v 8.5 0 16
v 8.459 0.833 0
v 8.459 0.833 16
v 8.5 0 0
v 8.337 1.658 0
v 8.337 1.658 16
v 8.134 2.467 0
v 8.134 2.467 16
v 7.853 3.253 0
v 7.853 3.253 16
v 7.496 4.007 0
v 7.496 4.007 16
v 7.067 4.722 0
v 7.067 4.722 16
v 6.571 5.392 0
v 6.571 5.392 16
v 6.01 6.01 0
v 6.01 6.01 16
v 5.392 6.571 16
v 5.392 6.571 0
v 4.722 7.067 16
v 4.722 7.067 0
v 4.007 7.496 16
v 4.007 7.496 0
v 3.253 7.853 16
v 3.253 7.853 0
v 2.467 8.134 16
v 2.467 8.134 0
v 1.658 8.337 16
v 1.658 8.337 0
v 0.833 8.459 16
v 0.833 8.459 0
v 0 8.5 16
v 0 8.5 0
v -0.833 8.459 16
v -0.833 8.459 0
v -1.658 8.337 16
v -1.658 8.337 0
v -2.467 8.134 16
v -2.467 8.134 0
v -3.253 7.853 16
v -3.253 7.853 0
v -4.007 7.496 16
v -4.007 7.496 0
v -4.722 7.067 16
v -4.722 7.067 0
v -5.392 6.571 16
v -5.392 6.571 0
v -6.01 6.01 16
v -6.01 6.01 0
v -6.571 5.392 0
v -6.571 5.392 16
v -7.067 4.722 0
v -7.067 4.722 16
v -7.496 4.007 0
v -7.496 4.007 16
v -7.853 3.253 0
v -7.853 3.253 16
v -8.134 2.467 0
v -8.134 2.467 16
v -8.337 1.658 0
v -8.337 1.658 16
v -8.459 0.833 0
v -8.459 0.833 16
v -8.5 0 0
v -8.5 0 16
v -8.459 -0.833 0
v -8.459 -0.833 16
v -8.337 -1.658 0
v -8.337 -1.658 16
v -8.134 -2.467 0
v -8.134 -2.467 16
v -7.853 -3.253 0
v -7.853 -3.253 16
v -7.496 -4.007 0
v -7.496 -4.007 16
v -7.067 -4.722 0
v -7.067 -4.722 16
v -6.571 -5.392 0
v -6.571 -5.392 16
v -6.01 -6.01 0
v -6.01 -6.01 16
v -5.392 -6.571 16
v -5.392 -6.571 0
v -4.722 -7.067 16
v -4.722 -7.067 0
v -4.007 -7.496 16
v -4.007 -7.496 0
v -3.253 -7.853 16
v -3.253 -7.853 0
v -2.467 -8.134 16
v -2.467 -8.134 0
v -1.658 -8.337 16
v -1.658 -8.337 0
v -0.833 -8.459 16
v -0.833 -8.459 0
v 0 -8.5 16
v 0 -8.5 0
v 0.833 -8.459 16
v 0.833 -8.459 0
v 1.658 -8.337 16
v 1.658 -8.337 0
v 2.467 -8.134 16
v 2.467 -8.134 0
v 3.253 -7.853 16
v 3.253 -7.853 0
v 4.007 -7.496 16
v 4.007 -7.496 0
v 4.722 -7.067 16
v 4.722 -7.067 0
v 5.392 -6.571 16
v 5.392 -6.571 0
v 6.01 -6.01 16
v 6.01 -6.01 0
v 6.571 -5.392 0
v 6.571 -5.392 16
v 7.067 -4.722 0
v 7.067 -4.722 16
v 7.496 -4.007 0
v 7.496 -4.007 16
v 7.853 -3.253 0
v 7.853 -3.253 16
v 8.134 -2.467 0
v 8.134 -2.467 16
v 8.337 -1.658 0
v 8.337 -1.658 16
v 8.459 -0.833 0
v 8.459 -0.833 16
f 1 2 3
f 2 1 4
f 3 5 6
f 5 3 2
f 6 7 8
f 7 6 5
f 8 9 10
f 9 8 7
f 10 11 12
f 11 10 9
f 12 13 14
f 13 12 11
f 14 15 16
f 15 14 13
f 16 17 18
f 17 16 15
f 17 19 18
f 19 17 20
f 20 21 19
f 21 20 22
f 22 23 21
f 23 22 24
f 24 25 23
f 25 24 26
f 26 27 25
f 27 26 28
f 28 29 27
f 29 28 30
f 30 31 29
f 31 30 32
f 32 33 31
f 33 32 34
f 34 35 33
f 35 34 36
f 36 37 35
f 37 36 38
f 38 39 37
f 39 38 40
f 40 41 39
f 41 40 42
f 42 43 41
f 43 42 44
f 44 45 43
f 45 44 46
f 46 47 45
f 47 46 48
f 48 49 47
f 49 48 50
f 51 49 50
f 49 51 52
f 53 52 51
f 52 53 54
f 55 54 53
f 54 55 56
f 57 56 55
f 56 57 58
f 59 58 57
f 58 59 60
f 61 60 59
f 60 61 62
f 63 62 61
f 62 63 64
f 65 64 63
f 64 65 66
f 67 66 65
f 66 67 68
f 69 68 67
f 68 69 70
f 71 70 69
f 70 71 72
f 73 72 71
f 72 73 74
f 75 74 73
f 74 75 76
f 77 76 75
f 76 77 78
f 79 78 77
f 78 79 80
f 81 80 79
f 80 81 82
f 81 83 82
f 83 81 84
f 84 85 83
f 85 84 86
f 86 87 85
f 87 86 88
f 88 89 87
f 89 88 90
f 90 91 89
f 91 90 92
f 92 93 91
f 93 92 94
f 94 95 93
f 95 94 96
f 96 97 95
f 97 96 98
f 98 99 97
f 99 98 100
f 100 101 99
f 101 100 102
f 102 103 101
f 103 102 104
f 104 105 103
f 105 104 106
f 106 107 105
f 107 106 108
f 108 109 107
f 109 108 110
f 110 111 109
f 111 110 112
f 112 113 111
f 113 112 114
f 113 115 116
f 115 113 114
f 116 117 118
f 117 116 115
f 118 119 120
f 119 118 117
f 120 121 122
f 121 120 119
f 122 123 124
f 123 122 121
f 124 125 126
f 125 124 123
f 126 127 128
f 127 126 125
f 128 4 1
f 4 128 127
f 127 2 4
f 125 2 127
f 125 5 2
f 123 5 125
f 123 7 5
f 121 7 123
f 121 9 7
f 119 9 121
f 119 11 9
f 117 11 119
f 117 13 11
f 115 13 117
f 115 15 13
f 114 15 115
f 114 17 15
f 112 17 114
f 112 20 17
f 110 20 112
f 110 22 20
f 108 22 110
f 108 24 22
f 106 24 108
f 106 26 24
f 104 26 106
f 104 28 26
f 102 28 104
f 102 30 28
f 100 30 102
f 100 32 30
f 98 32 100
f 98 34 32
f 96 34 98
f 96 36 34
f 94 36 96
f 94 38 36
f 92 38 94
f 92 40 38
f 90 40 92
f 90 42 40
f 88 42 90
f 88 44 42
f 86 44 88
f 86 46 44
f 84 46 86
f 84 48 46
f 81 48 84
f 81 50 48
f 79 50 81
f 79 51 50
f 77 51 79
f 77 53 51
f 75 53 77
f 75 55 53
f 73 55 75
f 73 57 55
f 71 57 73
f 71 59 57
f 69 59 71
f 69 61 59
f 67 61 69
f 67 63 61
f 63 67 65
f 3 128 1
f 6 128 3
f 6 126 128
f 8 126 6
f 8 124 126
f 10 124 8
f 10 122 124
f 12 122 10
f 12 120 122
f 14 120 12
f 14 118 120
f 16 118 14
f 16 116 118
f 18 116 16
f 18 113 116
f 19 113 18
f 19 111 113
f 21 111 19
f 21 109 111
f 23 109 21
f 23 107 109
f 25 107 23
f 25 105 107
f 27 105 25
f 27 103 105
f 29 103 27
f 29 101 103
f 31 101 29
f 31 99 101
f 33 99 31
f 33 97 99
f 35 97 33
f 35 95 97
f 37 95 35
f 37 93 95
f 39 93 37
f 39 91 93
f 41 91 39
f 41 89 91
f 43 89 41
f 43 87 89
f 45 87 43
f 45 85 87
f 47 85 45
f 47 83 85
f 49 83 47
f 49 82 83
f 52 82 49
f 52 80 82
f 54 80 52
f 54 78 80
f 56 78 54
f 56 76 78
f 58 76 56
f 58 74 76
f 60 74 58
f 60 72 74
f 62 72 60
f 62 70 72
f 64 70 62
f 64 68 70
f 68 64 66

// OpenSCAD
/* BandMate Project, bearing_axle.scad
 * bearing_axle.scad by Oskari Rundgren is licensed under the
 * Creative Commons Attribution-ShareAlike 4.0 International License.
 */

$fn = 64;

cylinder(r=8.5,h=16);
